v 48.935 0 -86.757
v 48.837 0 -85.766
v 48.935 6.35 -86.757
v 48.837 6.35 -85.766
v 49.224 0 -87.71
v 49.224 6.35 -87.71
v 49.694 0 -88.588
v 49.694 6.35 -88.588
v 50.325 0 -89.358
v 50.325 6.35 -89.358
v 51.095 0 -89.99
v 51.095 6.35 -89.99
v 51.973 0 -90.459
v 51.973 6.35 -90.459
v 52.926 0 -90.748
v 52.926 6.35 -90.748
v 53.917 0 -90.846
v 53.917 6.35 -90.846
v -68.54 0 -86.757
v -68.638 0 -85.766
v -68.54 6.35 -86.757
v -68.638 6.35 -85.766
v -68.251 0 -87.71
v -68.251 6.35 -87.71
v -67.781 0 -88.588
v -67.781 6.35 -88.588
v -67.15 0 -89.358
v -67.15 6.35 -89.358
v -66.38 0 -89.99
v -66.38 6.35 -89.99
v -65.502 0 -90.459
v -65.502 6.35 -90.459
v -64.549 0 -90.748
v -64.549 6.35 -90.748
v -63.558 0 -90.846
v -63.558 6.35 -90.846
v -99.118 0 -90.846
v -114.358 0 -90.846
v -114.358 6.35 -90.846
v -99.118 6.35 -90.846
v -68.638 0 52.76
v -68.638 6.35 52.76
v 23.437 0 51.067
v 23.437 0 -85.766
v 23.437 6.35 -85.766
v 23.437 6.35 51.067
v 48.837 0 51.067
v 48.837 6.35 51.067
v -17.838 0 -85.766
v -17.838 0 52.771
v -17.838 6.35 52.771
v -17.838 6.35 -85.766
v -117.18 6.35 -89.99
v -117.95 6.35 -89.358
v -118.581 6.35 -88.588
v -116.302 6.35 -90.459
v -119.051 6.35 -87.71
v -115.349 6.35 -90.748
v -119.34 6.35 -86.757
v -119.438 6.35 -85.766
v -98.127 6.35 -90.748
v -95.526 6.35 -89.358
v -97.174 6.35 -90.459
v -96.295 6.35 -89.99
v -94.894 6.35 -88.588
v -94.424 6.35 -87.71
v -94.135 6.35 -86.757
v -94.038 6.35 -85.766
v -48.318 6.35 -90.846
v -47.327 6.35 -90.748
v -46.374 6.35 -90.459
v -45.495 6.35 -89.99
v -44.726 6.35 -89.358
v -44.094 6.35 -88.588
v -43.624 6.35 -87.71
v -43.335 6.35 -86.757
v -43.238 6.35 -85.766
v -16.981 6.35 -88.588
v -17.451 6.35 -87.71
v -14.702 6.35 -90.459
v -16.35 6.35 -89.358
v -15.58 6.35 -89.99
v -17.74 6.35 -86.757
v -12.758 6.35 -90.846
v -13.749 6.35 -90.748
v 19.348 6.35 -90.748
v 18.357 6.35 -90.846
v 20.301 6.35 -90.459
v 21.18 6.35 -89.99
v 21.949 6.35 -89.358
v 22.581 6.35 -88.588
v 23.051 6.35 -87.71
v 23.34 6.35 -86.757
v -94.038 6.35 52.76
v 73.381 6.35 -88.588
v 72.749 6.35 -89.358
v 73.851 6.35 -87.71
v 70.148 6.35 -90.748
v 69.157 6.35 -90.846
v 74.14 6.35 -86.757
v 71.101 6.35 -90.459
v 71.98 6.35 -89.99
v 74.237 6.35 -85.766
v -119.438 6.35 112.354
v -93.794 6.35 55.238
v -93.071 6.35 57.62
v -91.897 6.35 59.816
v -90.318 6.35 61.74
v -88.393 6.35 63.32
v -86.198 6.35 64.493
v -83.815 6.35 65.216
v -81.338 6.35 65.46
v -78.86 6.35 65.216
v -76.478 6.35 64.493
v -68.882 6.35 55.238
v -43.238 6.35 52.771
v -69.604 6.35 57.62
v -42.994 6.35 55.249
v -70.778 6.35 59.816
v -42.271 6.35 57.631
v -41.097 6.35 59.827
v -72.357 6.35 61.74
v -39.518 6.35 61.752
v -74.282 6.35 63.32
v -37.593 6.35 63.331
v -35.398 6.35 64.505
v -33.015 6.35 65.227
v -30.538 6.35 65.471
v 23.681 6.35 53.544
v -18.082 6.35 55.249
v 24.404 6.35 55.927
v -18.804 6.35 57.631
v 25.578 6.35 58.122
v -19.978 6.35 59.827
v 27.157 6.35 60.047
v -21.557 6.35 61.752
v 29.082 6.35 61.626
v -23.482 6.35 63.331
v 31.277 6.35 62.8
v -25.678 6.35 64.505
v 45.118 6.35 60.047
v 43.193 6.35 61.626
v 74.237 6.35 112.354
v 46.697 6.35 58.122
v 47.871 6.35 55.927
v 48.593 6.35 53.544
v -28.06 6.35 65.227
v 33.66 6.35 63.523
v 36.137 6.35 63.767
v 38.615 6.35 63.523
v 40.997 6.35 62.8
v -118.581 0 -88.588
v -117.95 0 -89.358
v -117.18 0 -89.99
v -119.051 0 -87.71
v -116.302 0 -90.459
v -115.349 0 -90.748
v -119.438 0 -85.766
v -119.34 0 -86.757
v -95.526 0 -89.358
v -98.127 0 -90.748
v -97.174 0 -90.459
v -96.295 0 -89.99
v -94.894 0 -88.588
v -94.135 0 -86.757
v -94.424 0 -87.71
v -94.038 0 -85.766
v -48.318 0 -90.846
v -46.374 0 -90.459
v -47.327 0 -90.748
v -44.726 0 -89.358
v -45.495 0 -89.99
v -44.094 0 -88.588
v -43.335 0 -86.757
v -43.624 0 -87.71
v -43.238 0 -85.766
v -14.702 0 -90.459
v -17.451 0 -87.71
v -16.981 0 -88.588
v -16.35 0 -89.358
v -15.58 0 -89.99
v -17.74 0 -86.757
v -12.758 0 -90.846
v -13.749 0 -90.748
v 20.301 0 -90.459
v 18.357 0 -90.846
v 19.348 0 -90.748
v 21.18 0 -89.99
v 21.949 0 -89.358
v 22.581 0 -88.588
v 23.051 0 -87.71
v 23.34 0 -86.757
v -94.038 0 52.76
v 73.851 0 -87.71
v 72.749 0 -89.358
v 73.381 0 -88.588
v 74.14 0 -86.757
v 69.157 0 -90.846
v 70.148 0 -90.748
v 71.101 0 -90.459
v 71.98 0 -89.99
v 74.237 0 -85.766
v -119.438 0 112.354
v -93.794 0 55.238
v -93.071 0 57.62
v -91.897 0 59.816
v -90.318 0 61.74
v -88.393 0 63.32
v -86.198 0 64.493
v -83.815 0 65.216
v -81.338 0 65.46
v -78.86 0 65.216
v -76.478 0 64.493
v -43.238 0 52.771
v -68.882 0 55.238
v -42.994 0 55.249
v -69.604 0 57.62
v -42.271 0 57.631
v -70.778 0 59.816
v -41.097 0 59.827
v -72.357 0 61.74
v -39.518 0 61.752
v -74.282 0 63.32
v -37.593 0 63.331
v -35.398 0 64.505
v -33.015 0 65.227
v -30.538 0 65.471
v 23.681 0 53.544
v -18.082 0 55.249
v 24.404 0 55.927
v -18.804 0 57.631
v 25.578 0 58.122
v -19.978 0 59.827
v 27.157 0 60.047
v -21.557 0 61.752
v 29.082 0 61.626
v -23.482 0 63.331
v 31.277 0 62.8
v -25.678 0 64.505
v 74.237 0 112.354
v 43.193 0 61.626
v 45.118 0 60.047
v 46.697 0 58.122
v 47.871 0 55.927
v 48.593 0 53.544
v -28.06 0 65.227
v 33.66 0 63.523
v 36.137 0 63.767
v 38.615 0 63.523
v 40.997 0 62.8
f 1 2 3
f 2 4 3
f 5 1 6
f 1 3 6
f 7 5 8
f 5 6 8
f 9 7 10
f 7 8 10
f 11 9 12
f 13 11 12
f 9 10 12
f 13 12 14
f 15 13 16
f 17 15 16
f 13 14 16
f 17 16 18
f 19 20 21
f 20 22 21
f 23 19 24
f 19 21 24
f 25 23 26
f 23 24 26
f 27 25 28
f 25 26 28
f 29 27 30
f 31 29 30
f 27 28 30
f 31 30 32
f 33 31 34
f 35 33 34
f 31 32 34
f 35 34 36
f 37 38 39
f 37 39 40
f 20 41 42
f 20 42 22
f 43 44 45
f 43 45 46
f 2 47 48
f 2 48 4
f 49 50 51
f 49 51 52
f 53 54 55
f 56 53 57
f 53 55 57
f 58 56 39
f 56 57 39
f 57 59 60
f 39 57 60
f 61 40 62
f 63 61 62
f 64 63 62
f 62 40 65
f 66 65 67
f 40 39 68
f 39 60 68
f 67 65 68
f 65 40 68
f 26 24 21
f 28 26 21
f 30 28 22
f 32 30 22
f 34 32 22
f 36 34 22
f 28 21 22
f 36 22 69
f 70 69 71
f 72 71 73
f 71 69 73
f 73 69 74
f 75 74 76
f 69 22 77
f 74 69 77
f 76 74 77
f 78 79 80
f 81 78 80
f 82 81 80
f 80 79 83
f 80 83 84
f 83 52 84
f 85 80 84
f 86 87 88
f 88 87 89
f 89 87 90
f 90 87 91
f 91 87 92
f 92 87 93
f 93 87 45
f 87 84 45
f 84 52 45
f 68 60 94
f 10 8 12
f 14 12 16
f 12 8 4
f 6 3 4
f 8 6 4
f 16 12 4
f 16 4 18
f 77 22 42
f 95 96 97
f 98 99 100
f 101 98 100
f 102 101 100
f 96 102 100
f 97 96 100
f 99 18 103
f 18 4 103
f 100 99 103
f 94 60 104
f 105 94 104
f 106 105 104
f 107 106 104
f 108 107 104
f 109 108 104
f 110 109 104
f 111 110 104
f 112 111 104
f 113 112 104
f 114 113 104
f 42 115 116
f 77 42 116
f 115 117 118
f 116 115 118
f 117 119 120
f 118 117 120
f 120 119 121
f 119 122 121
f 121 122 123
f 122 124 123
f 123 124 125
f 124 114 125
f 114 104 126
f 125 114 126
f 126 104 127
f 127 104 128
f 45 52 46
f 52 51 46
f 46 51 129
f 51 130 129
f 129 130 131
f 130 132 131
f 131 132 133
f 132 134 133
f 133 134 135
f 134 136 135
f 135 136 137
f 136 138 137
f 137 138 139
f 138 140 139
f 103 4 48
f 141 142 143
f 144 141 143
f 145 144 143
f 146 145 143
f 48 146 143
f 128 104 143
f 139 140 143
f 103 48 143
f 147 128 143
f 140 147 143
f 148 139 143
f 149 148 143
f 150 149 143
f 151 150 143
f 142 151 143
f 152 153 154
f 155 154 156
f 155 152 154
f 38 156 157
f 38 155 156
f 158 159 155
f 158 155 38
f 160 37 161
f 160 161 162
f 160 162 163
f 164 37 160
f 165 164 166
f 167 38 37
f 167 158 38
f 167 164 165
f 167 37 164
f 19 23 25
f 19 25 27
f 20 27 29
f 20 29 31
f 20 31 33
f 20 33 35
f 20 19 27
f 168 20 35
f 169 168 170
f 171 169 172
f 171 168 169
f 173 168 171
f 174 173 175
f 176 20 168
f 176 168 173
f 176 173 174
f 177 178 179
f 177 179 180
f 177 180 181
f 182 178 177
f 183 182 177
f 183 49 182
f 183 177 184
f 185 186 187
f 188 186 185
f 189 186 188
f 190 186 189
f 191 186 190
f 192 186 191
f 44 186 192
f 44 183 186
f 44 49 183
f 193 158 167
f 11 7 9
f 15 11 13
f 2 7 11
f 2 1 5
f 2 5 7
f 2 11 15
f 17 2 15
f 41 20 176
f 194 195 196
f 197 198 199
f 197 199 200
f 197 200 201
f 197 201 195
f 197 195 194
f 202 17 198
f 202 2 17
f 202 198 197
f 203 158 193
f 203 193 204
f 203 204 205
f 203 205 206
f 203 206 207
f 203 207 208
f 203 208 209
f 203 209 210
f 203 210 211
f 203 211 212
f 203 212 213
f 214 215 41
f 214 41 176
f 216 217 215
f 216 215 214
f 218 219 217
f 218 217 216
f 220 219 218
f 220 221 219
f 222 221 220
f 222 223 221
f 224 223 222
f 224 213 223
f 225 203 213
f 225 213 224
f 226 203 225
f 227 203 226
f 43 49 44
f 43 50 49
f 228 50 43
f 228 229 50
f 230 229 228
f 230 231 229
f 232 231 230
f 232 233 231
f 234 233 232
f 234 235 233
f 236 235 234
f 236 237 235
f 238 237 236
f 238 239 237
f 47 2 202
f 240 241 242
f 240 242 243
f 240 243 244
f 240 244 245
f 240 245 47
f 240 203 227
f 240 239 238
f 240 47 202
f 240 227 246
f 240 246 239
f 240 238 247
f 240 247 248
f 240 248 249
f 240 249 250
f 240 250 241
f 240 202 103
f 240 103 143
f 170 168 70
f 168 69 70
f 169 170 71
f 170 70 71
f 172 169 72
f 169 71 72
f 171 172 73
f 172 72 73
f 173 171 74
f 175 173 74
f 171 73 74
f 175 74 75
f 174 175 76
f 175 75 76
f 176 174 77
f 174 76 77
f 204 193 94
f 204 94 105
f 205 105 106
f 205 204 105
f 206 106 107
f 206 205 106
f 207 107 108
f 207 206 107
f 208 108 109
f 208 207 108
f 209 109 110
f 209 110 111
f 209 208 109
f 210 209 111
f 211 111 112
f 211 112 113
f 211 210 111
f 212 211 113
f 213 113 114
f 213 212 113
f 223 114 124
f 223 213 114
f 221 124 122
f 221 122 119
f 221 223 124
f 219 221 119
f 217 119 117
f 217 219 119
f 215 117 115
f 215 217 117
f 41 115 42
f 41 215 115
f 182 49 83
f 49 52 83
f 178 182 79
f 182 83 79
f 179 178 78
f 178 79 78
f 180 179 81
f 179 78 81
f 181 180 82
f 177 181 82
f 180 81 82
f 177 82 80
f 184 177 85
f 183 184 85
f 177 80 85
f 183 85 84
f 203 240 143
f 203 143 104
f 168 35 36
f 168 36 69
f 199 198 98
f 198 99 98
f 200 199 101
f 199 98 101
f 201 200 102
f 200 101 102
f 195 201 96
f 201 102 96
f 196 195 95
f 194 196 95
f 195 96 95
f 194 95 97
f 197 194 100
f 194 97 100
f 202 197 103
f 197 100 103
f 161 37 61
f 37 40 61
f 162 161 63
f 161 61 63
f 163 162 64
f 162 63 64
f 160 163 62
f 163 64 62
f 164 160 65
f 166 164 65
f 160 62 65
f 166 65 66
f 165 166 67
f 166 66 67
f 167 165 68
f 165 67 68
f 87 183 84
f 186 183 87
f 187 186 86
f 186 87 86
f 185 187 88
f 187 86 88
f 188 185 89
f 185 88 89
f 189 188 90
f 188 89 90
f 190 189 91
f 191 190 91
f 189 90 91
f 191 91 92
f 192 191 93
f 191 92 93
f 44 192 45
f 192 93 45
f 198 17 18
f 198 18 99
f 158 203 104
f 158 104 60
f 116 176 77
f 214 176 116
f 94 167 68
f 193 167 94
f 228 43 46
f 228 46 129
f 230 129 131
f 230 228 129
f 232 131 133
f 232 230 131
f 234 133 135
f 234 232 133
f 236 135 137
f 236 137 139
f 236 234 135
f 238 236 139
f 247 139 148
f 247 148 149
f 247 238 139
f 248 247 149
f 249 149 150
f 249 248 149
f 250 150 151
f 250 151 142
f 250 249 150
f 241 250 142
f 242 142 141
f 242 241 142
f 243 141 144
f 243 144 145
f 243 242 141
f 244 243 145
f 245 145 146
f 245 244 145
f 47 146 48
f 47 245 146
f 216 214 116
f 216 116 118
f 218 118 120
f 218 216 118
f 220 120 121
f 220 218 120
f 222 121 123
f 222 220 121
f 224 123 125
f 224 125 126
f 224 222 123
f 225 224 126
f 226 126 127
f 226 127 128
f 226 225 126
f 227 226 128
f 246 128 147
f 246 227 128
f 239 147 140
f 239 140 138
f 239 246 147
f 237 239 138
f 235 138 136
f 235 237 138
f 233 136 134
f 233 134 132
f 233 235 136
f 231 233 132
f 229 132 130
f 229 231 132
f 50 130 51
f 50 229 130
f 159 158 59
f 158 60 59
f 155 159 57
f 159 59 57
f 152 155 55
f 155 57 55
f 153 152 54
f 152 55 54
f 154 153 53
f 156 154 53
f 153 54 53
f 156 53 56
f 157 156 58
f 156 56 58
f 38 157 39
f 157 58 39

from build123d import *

# Parameters (mm, degrees)
F1_DEPTH = 6.35
F2_R     = 5.08


with BuildPart() as f1:
    # F0 (on Front) → F1 (new body)
    with BuildSketch(Plane.XZ):
        with BuildLine():
            Line((74.237378, 112.354313), (-119.437622, 112.354313))
            Line((-119.437622, 112.354313), (-119.437622, -90.845687))
            Line((-119.437622, -90.845687), (-94.037622, -90.845687))
            Line((-94.037622, -90.845687), (-94.037622, 52.75996))
            ThreePointArc((-94.037622, 52.75996), (-81.337622, 65.45996), (-68.637622, 52.75996))
            Line((-68.637622, 52.75996), (-68.637622, -90.845687))
            Line((-68.637622, -90.845687), (-43.237622, -90.845687))
            Line((-43.237622, -90.845687), (-43.237622, 52.771378))
            ThreePointArc((-43.237622, 52.771378), (-30.537622, 65.471378), (-17.837622, 52.771378))
            Line((-17.837622, 52.771378), (-17.837622, -90.845687))
            Line((-17.837622, -90.845687), (23.437378, -90.845687))
            Line((23.437378, -90.845687), (23.437378, 51.066604))
            ThreePointArc((23.437378, 51.066604), (36.137378, 63.766604), (48.837378, 51.066604))
            Line((48.837378, 51.066604), (48.837378, -90.845687))
            Line((48.837378, -90.845687), (74.237378, -90.845687))
            Line((74.237378, -90.845687), (74.237378, 112.354313))
        make_face()
    extrude(amount=-F1_DEPTH)

    # F2
    f2_edges = [f1.edges().sort_by_distance(p)[0] for p in [
        (-94.037622, 3.175, -90.845687),
        (-68.637622, 3.175, -90.845687),
        (-43.237622, 3.175, -90.845687),
        (-17.837622, 3.175, -90.845687),
        (23.437378, 3.175, -90.845687),
        (48.837378, 3.175, -90.845687),
        (74.237378, 3.175, -90.845687),
        (-119.437622, 3.175, -90.845687),
    ]]
    fillet(f2_edges, radius=F2_R)


solid = f1.part
